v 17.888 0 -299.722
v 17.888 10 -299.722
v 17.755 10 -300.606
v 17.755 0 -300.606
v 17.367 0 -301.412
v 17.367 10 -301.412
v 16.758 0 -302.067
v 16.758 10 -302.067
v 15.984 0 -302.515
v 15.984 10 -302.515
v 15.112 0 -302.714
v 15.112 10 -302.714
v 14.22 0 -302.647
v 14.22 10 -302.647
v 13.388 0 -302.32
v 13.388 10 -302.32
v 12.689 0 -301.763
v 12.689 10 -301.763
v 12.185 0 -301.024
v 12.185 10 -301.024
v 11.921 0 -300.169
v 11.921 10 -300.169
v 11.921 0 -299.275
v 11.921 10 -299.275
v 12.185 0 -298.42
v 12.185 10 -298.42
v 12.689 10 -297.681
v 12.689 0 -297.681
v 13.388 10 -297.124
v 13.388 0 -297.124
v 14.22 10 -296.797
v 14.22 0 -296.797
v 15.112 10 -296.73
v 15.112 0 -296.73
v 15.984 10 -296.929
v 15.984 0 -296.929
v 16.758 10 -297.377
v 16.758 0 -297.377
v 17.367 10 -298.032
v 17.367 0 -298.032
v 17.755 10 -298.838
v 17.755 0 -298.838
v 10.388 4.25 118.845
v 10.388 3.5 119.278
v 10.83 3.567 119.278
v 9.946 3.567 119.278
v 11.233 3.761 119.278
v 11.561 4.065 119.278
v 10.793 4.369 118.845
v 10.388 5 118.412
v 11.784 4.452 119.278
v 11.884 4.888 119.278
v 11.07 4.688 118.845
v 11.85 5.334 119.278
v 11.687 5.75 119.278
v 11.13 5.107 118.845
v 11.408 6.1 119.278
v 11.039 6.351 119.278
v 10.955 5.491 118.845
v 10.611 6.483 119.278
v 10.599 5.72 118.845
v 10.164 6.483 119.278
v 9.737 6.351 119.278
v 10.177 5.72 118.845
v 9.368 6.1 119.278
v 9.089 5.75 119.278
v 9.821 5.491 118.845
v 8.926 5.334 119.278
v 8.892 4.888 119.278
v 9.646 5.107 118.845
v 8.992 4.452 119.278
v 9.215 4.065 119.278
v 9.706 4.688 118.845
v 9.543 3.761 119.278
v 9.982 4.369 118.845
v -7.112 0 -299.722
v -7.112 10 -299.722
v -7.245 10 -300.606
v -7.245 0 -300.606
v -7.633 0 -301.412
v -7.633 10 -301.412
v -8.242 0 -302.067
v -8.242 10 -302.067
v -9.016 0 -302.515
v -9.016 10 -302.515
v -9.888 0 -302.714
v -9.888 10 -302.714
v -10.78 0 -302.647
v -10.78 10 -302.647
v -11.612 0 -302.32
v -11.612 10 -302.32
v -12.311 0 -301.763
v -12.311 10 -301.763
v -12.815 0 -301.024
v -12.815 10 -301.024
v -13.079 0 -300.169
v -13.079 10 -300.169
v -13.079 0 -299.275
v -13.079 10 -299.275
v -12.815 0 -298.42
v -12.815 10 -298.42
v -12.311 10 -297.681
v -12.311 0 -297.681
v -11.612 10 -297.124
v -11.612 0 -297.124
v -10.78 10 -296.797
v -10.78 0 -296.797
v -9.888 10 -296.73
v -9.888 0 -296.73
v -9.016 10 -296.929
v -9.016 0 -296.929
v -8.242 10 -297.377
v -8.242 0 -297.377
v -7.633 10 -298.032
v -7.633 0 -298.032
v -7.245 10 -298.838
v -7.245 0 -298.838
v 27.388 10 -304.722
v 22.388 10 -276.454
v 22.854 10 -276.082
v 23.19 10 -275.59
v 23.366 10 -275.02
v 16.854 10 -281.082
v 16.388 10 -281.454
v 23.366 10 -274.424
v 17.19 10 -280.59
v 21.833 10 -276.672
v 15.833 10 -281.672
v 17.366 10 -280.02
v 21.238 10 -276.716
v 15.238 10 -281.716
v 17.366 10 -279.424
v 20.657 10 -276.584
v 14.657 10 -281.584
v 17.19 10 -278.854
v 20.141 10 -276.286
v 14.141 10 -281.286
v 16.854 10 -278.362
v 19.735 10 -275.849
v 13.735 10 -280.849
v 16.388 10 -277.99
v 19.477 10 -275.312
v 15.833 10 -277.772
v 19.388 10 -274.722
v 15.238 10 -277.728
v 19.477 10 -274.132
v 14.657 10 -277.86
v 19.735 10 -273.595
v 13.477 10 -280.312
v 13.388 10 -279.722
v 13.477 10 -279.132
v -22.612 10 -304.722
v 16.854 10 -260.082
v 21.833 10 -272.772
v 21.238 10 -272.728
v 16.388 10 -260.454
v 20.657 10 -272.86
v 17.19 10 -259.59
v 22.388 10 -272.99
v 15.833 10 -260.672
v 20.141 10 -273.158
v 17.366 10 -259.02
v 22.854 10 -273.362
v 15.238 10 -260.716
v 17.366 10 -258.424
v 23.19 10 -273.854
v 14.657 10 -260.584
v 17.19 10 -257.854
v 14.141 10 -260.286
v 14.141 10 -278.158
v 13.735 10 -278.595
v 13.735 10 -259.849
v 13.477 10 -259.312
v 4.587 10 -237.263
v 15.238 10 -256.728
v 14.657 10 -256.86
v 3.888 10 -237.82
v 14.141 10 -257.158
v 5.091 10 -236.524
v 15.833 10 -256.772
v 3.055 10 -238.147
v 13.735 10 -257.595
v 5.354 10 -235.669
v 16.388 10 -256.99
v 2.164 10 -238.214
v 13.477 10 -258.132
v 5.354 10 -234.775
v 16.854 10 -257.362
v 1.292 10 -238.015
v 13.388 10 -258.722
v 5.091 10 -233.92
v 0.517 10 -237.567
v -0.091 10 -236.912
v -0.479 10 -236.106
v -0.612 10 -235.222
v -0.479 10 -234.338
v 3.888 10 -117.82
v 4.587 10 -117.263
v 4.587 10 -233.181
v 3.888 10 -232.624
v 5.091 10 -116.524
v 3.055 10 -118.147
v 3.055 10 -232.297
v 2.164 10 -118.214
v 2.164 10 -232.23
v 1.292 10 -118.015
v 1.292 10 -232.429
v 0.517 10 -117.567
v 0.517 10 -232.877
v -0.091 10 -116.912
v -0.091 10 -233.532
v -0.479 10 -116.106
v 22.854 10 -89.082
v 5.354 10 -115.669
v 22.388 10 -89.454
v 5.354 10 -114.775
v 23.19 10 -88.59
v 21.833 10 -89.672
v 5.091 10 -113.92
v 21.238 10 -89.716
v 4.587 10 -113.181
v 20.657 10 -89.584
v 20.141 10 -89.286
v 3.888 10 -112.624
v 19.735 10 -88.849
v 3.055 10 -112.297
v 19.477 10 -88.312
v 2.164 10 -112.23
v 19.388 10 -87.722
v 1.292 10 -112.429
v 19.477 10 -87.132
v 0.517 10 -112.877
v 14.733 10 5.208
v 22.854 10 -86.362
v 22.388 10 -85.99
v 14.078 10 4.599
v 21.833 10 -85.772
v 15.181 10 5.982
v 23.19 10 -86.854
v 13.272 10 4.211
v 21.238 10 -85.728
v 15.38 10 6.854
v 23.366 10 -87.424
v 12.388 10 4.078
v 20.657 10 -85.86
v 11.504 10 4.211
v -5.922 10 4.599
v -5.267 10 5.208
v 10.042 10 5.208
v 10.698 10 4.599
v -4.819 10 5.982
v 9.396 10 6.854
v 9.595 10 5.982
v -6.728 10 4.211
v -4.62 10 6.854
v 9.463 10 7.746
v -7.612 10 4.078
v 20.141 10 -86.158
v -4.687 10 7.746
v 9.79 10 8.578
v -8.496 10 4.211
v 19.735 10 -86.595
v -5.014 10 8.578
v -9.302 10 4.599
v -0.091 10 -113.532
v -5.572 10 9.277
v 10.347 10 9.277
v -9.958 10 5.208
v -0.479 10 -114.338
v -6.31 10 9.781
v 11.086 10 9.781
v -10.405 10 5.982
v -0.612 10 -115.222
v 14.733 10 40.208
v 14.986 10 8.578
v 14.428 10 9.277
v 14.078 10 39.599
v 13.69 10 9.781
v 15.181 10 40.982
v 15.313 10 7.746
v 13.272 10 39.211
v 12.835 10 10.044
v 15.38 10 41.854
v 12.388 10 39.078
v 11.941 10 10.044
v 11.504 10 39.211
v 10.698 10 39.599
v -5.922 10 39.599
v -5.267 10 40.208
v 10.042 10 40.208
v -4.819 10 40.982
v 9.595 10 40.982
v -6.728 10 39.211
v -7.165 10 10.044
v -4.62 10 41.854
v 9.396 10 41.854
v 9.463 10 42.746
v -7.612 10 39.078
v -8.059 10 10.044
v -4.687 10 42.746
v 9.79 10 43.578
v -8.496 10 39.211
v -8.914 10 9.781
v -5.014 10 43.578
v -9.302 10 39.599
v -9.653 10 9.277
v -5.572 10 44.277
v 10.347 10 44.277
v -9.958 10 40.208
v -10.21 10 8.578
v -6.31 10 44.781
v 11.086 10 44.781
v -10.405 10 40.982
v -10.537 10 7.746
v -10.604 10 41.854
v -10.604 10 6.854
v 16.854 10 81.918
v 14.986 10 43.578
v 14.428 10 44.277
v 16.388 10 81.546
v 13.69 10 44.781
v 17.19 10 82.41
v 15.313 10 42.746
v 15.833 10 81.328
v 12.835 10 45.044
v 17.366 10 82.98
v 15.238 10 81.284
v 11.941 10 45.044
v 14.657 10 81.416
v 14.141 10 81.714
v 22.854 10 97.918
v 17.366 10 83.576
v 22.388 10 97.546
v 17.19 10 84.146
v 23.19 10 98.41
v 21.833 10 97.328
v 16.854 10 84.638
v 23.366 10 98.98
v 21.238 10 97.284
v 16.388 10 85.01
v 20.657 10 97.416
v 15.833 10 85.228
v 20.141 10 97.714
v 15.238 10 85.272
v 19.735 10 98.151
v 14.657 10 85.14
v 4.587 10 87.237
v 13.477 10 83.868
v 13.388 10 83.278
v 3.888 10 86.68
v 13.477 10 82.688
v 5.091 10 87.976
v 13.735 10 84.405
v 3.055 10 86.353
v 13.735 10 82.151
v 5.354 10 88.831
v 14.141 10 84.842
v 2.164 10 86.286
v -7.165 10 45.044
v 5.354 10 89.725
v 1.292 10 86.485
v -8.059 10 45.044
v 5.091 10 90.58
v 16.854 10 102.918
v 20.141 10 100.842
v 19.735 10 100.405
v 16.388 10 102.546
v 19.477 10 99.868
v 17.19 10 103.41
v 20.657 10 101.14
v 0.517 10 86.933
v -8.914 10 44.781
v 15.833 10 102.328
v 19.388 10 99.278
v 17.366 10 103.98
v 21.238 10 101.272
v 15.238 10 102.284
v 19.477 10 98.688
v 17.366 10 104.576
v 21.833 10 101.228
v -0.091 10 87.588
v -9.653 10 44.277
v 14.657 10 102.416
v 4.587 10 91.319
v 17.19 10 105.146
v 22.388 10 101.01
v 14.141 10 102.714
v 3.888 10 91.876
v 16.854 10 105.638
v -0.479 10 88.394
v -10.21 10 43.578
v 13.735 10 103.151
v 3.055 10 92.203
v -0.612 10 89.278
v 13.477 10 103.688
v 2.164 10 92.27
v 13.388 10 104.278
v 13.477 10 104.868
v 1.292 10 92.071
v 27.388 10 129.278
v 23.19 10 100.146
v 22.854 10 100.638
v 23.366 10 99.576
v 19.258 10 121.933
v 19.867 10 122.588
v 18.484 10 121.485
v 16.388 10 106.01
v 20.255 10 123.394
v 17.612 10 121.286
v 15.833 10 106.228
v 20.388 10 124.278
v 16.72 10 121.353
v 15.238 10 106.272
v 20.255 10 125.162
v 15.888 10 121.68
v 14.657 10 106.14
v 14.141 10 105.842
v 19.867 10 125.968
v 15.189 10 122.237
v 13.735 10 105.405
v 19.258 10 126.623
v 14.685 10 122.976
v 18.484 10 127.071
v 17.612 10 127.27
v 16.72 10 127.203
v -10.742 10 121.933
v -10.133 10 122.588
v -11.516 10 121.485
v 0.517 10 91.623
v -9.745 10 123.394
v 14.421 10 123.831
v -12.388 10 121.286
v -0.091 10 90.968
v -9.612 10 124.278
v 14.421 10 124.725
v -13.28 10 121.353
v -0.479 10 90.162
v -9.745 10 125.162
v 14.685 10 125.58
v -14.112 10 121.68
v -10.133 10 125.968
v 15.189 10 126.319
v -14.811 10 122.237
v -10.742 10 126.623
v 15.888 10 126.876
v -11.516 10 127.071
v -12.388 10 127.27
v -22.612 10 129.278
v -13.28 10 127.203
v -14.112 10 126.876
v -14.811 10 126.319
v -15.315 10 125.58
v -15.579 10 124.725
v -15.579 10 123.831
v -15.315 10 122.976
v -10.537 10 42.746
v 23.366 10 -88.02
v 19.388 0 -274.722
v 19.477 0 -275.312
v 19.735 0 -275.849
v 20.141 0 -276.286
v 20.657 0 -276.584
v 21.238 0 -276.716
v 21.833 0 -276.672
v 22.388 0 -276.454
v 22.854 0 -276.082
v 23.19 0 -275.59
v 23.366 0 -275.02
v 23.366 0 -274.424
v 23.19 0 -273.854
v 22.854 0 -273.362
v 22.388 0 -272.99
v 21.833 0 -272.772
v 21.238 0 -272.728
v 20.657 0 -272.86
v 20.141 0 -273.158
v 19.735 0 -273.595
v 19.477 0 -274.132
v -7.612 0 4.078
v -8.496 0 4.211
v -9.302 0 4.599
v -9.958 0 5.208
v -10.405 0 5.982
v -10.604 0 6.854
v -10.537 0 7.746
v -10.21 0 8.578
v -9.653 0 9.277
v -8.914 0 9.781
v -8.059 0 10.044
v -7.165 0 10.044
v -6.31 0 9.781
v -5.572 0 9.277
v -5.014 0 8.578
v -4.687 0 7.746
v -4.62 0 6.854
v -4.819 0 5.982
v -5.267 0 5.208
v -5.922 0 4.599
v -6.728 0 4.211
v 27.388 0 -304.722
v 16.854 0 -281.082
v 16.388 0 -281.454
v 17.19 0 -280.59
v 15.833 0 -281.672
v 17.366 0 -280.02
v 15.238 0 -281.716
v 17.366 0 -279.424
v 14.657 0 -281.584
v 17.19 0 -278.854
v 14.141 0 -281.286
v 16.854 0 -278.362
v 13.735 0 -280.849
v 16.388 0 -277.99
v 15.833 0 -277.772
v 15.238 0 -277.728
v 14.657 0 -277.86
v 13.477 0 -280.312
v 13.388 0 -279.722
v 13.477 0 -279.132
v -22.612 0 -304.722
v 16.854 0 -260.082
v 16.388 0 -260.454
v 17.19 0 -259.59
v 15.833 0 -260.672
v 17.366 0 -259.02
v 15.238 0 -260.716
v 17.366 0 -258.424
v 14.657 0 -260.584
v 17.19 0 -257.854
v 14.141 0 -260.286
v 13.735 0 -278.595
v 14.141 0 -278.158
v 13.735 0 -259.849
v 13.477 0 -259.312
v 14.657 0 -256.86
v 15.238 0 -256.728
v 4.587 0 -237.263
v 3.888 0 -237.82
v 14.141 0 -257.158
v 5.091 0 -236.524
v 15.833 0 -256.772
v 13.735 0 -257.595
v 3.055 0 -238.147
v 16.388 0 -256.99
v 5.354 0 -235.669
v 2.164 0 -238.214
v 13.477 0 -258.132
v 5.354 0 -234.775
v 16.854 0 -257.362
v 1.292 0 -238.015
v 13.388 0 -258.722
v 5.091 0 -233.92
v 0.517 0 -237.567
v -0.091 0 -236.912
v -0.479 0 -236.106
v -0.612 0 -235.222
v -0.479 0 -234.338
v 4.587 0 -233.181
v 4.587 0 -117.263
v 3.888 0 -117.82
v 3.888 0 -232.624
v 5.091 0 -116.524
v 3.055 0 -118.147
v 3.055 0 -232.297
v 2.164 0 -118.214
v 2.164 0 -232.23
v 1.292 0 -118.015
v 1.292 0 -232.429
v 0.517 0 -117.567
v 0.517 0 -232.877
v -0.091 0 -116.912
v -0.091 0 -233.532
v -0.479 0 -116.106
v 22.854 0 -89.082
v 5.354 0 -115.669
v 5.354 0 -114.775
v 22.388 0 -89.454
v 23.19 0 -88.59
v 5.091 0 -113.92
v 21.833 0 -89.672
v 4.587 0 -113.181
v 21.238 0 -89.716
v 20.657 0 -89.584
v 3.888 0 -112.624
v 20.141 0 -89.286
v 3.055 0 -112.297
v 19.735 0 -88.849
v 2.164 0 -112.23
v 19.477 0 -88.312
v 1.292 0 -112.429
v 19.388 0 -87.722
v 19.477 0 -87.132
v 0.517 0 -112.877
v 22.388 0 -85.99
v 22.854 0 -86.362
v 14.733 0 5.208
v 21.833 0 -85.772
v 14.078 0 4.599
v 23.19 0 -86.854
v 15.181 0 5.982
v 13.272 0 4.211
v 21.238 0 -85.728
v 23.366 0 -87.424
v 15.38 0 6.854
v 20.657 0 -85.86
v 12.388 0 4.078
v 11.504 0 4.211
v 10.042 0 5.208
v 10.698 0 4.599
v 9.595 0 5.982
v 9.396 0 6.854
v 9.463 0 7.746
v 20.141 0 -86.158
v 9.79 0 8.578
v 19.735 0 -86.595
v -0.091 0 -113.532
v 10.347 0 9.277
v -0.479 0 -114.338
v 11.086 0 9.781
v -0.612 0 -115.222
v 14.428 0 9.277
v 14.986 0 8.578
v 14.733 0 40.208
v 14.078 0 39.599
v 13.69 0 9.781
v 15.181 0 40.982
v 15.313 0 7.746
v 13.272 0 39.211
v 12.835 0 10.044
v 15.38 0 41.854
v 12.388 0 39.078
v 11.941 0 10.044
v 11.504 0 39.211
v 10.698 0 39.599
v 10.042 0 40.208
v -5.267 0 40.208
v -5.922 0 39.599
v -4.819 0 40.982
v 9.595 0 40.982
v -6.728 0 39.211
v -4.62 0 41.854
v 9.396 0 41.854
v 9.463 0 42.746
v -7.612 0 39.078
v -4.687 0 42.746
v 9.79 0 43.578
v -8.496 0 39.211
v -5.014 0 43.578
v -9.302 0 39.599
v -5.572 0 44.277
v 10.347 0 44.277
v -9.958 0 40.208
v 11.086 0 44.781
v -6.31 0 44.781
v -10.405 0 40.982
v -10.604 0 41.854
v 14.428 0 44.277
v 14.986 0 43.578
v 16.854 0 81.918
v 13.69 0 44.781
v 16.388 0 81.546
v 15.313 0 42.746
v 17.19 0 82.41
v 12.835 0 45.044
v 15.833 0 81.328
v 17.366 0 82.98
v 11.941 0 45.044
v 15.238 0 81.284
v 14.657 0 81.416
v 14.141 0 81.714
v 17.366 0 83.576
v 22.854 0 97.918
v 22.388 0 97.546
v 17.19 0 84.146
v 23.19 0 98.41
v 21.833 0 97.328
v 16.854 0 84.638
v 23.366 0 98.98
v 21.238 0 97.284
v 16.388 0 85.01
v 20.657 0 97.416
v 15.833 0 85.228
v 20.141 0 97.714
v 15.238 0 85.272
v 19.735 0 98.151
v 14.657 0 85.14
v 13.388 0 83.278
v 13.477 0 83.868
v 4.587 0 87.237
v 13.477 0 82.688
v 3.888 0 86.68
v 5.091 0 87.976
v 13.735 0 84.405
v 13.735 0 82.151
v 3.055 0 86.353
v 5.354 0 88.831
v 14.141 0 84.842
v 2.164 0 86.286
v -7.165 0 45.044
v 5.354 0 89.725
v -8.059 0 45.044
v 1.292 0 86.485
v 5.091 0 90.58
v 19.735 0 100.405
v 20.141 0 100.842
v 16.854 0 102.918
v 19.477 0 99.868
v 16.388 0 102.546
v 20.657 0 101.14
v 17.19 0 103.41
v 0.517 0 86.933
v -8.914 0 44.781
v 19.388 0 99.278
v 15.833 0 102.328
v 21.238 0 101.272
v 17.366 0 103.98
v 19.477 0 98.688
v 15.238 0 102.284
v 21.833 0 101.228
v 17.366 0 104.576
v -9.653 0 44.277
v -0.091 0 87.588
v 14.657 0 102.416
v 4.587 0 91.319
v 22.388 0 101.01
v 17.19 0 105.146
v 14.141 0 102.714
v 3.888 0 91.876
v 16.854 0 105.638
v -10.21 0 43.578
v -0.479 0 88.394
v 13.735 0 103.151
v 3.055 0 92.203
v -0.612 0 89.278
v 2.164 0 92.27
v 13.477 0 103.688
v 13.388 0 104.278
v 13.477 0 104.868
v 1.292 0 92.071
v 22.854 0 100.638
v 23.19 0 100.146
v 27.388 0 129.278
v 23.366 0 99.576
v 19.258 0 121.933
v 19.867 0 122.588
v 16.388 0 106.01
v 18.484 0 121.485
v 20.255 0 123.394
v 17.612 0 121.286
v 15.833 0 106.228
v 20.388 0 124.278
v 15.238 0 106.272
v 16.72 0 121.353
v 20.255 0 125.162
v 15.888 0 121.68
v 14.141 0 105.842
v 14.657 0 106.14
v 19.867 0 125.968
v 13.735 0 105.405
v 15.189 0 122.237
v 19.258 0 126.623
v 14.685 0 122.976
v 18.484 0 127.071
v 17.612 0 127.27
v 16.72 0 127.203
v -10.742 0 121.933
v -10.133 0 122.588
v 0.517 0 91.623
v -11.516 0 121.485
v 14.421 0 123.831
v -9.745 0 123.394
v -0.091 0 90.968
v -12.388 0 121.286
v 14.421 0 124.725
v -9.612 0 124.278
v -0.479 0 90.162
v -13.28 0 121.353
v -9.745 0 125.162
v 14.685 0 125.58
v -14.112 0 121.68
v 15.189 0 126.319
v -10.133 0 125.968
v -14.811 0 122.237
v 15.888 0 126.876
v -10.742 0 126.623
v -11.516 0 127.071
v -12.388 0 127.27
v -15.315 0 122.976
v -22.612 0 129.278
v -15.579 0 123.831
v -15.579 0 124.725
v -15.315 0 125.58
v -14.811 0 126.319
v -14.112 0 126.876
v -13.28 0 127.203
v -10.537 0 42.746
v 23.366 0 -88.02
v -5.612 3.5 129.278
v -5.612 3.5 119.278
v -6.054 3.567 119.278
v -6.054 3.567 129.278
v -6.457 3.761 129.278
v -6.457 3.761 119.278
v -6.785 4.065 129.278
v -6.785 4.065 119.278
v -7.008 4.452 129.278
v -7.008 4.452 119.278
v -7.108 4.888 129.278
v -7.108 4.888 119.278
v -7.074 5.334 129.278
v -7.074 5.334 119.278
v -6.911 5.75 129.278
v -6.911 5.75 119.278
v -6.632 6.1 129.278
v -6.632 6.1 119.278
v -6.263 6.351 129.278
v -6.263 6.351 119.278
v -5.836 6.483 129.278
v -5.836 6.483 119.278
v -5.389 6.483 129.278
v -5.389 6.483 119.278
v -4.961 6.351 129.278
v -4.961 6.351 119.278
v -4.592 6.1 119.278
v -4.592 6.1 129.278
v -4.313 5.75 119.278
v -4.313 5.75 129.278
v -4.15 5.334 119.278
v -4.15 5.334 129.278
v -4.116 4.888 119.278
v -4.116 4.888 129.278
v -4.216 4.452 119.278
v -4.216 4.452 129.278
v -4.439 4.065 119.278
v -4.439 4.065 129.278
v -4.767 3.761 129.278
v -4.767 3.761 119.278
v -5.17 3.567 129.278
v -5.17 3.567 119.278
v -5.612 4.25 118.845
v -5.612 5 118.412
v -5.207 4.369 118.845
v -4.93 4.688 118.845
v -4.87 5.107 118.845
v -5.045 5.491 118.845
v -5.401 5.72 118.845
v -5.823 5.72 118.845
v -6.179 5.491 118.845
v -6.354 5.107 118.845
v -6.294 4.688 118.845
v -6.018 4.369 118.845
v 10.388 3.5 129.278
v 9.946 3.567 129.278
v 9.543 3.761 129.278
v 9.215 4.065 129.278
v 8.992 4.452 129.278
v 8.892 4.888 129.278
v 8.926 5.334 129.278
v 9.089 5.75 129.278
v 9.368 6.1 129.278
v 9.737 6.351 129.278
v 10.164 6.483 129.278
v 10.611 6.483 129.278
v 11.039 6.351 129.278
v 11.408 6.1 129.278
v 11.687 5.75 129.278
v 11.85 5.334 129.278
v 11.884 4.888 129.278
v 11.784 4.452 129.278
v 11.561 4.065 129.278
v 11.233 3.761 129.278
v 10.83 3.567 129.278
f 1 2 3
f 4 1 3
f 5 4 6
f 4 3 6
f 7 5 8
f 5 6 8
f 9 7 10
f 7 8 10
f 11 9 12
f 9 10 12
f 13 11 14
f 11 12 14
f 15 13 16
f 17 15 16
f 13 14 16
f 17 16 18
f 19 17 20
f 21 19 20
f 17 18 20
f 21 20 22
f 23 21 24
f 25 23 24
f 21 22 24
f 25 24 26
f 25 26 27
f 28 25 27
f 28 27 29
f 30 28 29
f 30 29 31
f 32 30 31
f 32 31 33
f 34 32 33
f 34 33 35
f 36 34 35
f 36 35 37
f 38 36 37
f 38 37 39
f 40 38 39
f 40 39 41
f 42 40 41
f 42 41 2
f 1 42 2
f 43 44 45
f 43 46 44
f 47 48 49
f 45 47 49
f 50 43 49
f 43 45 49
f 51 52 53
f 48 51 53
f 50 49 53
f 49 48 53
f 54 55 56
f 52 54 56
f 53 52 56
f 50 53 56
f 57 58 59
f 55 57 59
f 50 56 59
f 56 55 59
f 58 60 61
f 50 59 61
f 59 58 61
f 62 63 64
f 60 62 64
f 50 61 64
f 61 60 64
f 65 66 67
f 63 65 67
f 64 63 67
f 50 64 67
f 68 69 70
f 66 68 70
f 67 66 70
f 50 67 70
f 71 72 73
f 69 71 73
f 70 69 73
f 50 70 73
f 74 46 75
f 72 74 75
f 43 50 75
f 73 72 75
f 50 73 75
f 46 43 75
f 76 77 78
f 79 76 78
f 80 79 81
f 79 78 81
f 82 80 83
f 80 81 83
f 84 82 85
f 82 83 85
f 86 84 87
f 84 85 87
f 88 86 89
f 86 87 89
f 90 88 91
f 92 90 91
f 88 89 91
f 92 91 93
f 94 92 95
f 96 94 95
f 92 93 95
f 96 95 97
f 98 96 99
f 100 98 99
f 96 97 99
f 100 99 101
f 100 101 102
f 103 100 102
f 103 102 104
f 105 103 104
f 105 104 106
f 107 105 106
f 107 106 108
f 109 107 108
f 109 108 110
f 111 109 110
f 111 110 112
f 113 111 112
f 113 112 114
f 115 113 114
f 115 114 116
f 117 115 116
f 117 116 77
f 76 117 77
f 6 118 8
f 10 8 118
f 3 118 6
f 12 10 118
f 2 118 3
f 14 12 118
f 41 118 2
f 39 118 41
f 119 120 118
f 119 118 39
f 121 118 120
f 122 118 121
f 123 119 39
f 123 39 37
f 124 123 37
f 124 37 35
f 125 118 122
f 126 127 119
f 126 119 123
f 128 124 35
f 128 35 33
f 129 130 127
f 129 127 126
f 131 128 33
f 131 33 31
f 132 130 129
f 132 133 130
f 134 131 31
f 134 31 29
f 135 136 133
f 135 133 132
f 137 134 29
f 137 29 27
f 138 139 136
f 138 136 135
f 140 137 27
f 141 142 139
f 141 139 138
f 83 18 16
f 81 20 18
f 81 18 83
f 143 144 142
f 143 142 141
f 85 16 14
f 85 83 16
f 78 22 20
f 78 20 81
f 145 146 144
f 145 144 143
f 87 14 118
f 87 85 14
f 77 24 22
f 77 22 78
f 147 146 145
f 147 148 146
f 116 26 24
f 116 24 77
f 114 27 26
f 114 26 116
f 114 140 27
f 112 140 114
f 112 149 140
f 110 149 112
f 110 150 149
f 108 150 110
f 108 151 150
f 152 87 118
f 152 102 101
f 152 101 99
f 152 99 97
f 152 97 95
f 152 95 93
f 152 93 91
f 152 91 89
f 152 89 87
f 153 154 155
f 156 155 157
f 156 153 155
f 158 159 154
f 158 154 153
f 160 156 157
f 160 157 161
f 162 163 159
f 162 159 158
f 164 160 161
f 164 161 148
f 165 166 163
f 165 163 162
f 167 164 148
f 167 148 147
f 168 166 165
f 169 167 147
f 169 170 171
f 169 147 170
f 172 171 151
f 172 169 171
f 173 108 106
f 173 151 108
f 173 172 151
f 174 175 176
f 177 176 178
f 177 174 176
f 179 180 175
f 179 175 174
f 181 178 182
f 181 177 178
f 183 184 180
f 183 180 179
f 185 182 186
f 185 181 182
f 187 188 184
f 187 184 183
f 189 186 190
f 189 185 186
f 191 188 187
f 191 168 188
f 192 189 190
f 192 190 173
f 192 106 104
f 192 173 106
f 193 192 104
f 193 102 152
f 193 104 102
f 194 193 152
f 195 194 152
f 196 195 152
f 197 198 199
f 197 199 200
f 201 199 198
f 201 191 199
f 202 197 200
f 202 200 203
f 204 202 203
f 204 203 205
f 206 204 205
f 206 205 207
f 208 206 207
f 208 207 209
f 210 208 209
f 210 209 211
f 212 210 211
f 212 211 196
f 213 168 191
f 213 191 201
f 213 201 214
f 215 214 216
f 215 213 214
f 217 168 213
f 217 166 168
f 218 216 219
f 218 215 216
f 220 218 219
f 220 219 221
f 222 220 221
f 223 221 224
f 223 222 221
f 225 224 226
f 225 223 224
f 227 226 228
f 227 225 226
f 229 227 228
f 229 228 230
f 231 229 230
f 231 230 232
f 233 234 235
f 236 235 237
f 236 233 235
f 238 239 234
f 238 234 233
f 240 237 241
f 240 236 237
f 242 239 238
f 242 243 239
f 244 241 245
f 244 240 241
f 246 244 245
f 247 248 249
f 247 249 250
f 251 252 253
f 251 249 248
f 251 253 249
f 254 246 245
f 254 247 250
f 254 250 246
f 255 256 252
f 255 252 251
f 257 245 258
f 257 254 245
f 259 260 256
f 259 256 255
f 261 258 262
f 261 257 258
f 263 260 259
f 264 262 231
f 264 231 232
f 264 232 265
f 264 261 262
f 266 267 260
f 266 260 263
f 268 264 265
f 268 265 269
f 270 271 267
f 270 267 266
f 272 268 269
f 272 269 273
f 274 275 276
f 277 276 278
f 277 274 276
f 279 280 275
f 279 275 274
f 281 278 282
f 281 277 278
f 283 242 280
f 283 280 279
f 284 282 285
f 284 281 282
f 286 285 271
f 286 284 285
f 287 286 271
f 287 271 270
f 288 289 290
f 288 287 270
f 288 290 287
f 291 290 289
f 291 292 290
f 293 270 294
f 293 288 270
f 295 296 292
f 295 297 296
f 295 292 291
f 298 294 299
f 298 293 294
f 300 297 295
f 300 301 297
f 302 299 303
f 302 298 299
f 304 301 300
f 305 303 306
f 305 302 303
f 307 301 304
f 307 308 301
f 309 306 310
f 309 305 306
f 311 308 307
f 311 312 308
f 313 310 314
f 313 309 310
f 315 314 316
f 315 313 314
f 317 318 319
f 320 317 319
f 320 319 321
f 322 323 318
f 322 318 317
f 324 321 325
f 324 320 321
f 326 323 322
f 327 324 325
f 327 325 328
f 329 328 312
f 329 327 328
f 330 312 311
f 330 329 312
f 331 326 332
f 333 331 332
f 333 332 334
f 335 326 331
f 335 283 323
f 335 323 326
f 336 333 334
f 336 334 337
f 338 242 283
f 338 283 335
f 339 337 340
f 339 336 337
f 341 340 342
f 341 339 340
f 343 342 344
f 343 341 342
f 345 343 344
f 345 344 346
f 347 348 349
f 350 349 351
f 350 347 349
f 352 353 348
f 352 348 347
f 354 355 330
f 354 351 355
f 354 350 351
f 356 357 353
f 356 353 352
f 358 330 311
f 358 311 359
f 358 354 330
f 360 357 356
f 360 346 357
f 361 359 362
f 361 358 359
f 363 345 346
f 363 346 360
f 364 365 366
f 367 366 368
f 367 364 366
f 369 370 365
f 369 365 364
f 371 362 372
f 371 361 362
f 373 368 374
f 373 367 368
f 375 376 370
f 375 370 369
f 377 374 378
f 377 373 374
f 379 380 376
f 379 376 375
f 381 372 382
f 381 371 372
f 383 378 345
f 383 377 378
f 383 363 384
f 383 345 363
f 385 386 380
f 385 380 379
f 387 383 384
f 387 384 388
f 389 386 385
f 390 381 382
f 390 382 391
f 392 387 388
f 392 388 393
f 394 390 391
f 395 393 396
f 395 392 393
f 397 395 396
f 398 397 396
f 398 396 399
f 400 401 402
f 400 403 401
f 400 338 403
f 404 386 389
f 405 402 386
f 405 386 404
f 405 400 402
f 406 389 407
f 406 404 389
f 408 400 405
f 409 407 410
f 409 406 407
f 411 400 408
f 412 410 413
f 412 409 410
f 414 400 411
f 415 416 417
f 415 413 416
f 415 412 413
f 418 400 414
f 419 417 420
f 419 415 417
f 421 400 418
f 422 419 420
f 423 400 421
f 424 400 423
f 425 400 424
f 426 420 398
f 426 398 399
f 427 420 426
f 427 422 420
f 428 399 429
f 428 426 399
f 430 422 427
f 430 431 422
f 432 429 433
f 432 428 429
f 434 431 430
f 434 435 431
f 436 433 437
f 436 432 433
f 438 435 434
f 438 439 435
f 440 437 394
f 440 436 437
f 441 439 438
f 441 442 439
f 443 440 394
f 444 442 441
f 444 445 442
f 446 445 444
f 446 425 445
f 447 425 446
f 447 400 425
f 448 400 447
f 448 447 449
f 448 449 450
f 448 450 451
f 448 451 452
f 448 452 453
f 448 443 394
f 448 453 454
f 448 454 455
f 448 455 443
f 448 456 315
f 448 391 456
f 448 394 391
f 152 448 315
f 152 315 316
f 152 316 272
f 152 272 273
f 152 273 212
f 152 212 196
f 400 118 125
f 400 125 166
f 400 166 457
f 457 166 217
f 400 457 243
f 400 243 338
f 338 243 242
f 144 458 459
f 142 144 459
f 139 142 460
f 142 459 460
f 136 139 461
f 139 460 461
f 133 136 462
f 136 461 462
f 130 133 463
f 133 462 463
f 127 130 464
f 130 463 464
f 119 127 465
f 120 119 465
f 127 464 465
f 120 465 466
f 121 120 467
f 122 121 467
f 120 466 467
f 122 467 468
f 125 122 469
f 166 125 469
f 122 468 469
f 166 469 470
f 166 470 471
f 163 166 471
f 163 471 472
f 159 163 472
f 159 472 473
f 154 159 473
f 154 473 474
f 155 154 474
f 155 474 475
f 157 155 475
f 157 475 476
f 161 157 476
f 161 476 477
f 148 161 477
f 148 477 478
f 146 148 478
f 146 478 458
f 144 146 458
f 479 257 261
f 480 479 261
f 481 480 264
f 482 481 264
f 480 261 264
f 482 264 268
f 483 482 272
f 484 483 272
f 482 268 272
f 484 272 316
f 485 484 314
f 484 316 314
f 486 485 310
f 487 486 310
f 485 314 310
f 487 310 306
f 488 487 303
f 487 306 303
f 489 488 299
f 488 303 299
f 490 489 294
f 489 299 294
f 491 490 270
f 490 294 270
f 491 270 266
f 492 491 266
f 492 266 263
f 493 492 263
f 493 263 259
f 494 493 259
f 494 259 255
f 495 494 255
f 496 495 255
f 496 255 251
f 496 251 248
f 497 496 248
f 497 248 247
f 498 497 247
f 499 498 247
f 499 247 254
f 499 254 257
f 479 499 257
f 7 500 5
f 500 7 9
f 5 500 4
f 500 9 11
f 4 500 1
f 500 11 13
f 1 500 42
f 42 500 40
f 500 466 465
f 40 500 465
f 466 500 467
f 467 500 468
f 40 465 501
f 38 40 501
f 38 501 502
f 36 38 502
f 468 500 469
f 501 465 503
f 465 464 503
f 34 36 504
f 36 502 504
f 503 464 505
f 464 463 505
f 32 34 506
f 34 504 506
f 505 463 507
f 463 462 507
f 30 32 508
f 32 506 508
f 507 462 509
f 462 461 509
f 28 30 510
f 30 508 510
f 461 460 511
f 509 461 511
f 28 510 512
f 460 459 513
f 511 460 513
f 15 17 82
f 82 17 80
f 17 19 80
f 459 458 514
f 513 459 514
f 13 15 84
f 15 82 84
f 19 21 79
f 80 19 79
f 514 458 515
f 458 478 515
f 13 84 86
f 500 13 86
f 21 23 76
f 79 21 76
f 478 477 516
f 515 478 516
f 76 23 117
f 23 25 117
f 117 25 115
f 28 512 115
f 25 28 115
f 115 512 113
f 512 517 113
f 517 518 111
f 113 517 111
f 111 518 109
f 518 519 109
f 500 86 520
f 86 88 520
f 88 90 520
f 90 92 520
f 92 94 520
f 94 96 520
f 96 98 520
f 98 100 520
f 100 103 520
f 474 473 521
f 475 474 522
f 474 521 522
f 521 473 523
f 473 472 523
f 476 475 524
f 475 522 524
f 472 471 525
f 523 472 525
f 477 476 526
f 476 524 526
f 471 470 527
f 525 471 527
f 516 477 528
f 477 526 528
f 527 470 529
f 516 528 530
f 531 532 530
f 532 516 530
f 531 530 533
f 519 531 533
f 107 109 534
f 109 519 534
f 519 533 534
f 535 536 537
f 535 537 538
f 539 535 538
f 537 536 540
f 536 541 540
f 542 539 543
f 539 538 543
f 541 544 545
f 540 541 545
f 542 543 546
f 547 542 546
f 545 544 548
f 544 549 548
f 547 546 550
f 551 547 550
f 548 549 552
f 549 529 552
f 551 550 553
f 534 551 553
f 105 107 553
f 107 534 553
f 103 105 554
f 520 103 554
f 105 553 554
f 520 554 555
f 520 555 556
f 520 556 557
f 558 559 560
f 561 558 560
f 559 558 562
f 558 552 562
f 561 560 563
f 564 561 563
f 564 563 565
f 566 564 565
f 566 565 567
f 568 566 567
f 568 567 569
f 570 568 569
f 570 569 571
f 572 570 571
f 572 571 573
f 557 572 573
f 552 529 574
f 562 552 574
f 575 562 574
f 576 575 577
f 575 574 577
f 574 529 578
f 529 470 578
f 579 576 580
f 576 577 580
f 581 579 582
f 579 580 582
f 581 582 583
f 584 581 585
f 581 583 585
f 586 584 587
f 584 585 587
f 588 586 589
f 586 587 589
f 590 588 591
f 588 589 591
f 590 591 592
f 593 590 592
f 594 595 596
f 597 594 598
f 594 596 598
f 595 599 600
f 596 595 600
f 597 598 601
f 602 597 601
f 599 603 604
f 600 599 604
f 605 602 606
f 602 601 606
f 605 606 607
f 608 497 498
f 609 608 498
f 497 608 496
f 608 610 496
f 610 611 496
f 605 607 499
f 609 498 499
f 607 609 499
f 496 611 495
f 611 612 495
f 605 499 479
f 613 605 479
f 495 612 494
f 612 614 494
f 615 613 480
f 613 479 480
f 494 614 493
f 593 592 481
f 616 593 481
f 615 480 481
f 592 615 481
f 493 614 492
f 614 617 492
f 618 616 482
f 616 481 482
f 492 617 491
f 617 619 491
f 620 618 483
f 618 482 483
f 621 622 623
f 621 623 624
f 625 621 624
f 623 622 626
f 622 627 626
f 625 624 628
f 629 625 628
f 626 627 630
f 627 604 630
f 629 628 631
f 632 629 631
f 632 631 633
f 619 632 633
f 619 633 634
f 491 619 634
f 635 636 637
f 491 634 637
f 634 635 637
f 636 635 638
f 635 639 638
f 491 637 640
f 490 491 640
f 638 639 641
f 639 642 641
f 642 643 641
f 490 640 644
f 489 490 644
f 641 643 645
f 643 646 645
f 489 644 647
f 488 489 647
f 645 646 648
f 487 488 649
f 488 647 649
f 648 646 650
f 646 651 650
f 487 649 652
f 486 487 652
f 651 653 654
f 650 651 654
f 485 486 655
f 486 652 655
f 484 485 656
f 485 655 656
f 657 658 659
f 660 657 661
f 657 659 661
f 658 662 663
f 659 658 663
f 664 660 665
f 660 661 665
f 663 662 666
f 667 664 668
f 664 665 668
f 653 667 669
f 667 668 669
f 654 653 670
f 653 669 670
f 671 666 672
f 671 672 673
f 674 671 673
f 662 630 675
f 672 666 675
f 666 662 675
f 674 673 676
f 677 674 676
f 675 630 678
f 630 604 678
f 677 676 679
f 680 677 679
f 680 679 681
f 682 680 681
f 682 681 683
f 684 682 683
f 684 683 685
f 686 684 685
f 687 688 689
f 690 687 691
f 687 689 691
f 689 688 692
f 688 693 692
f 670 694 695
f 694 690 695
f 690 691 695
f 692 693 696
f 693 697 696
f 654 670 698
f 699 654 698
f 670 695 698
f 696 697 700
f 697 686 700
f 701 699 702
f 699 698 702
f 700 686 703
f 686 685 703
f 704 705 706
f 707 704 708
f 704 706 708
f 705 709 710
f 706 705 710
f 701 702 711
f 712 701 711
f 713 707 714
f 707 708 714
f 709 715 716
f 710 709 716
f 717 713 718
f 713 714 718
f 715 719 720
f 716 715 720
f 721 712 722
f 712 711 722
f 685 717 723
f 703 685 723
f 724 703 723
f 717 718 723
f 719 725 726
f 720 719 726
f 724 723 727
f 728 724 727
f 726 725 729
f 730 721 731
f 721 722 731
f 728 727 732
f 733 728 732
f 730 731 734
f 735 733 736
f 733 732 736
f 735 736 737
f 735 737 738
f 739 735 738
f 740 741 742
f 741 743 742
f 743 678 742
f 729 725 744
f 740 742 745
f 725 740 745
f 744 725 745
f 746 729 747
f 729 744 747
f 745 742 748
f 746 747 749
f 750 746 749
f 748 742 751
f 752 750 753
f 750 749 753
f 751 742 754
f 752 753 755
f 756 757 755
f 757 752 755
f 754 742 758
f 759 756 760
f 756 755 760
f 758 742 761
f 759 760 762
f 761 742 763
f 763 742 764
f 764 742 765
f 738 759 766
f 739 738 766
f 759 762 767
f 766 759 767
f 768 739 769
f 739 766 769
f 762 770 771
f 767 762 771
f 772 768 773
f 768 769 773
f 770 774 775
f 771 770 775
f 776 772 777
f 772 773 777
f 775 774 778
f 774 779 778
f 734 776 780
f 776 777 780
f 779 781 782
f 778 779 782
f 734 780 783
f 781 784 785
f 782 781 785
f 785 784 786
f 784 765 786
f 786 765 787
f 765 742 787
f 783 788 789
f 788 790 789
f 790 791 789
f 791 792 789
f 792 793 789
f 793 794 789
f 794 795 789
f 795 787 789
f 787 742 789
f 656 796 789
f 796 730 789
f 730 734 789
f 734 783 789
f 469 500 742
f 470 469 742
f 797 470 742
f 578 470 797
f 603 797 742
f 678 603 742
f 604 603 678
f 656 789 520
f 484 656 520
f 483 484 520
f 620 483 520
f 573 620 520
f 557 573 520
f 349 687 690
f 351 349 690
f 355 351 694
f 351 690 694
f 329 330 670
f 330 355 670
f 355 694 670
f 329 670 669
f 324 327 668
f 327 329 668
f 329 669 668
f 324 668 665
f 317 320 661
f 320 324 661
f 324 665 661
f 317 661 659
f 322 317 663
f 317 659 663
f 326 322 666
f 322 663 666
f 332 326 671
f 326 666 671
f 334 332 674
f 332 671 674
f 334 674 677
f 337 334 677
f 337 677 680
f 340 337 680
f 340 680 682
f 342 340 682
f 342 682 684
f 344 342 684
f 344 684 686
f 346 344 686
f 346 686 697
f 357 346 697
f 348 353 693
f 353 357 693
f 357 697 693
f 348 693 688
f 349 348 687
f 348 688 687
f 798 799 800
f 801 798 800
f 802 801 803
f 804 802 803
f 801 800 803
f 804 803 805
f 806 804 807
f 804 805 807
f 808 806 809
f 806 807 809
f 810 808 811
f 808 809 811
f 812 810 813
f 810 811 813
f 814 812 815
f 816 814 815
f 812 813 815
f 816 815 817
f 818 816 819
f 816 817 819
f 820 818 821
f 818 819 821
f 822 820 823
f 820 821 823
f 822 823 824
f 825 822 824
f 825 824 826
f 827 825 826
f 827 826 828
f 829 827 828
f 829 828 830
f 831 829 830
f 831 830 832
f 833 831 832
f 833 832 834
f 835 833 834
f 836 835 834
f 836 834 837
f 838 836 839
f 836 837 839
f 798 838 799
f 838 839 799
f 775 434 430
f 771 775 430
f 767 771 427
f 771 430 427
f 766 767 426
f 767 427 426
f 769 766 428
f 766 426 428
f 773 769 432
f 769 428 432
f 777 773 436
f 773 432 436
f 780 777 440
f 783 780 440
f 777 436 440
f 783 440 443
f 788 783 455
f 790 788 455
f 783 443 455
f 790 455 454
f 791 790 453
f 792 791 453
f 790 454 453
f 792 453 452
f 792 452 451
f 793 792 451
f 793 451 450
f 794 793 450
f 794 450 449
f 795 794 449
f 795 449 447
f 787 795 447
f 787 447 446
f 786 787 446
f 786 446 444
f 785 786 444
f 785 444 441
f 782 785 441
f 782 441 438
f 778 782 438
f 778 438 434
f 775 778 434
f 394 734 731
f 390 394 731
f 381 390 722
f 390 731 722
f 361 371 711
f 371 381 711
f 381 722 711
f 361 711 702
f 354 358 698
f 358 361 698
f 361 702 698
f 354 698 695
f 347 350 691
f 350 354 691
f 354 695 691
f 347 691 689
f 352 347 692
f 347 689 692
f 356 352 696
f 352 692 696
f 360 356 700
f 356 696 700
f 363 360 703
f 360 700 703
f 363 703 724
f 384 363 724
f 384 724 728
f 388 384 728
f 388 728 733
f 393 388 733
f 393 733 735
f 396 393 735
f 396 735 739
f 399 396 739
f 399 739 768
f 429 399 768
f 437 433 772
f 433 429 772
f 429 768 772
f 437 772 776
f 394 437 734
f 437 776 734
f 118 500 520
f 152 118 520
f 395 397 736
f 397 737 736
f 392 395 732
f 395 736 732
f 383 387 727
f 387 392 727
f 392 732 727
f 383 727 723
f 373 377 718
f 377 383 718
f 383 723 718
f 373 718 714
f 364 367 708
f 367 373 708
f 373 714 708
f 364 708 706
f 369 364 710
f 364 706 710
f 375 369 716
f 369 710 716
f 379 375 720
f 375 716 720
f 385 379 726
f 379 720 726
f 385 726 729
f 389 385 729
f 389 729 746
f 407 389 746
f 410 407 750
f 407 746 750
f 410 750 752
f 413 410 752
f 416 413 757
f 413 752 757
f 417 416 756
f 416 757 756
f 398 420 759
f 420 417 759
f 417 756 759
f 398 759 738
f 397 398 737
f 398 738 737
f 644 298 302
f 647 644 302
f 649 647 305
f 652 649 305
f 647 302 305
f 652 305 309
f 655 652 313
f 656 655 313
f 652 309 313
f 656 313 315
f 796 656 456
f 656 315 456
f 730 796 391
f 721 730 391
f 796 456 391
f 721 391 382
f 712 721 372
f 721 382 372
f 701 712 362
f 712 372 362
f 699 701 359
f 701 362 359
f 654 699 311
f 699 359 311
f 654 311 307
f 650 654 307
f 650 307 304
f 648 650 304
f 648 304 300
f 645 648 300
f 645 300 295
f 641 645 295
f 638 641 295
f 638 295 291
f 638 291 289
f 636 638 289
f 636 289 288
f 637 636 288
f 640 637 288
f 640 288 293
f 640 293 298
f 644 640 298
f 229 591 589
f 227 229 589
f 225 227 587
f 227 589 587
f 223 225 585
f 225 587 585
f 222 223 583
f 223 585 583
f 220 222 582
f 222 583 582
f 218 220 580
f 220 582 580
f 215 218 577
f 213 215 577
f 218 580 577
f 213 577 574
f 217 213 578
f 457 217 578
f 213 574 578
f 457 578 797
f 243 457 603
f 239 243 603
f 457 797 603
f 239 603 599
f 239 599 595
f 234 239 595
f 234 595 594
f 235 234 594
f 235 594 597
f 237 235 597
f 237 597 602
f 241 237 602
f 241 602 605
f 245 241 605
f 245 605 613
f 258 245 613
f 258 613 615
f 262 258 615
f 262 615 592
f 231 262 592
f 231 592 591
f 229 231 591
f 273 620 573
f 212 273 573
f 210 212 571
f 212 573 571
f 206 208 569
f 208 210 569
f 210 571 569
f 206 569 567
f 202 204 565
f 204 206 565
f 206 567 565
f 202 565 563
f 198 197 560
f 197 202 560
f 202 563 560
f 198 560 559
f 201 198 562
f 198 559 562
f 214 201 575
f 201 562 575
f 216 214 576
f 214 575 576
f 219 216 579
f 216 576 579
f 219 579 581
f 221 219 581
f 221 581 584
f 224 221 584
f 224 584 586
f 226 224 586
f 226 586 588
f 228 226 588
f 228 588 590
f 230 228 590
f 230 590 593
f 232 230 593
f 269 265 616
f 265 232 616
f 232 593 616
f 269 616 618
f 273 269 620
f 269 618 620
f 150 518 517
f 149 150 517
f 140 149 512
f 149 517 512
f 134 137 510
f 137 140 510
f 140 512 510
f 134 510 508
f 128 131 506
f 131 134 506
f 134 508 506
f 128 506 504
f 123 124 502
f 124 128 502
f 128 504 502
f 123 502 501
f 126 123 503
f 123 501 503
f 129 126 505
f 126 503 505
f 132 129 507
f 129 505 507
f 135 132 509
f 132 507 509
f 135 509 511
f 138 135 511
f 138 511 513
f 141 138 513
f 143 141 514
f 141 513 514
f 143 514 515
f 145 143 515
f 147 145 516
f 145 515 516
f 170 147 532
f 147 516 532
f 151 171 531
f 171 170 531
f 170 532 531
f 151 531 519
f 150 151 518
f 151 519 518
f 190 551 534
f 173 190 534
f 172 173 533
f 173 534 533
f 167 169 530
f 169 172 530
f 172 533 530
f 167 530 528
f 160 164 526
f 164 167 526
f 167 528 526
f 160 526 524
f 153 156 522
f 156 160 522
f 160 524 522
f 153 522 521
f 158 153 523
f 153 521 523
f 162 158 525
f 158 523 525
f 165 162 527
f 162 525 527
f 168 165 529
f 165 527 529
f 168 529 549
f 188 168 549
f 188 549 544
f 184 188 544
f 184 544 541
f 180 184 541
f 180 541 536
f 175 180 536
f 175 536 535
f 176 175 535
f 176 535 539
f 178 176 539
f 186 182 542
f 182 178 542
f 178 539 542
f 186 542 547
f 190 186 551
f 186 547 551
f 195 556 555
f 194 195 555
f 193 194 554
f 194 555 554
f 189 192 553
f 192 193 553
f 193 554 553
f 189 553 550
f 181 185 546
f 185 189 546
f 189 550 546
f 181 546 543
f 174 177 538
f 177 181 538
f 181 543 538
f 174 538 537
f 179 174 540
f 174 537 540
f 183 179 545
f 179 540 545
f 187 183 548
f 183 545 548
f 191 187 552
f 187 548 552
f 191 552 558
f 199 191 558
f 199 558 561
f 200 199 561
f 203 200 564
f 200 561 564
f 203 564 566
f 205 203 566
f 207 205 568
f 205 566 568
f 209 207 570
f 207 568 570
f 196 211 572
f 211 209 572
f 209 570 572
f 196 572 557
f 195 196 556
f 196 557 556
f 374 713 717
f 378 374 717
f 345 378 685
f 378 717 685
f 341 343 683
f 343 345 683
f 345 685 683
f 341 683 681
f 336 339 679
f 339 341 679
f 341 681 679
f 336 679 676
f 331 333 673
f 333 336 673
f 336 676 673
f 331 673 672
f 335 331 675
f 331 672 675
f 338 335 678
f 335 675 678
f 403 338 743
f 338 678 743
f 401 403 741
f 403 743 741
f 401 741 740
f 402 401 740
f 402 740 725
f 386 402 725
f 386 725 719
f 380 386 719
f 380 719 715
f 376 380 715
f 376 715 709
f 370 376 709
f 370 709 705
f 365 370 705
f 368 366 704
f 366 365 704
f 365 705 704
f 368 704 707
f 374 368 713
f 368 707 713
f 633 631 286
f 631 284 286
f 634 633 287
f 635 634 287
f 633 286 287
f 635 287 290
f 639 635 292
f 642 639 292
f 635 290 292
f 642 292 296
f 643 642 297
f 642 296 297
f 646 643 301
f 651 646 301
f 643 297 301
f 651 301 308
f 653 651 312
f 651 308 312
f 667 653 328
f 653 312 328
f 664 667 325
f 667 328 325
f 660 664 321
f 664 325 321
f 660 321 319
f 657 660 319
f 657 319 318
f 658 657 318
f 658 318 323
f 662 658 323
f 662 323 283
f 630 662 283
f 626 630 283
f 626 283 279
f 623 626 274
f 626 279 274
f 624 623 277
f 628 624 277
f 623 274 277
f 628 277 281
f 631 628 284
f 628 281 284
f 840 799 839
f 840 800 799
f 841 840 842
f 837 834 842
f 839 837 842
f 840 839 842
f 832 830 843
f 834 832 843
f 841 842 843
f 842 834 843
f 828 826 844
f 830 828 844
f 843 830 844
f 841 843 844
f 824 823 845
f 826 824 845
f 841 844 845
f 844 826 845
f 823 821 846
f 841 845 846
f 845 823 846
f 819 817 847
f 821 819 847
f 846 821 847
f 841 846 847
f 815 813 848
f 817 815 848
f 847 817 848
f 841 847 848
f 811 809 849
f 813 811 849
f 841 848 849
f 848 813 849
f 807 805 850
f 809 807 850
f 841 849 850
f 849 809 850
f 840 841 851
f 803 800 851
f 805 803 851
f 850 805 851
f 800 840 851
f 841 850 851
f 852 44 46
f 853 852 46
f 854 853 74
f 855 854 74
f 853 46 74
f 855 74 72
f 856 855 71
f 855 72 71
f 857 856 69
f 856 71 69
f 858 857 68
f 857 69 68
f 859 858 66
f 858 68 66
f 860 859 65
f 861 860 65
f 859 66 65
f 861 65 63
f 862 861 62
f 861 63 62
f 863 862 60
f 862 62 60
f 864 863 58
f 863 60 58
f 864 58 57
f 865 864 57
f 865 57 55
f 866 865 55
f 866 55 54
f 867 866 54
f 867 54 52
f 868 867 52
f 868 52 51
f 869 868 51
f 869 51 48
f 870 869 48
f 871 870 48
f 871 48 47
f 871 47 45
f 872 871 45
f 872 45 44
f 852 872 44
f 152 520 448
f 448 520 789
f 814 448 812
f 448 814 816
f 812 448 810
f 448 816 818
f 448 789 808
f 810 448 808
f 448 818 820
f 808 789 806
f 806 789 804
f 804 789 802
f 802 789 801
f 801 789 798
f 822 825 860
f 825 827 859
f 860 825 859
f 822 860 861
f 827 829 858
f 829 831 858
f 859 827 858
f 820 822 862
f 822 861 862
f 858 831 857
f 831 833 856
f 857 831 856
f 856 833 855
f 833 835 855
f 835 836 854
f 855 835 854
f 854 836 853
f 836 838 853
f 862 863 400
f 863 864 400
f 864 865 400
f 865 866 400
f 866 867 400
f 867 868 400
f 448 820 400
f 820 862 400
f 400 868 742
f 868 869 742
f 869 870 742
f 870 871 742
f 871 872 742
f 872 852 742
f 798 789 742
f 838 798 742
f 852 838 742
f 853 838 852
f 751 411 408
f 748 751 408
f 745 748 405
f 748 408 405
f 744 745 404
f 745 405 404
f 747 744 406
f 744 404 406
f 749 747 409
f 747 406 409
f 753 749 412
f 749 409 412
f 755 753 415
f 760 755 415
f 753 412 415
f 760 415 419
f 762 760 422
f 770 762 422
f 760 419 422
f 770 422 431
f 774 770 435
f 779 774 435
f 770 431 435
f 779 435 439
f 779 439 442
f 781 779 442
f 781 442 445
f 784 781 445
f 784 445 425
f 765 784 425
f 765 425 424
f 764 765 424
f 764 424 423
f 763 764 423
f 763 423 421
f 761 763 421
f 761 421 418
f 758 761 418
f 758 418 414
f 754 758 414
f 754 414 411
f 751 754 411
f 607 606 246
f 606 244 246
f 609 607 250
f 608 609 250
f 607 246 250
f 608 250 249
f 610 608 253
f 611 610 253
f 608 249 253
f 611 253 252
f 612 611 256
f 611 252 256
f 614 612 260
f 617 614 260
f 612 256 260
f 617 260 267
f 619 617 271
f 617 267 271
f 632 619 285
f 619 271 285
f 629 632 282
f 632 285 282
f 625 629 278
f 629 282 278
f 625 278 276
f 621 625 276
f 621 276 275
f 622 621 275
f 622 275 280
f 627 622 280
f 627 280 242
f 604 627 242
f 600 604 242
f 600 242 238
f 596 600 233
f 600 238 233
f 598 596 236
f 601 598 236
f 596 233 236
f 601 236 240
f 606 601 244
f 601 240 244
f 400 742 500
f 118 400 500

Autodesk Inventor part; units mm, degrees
ref_plane "YZ Plane" through (0, 0, 0) normal (1, 0, 0) x (0, 1, 0)
ref_plane "XZ Plane" through (0, 0, 0) normal (0, 1, 0) x (-1, 0, 0)
ref_plane "XY Plane" through (0, 0, 0) normal (0, 0, 1) x (1, 0, 0)
sketch "Boceto1" plane through (0, 0, 0) normal (0, 1, 0) x (-1, 0, 0)
  line L0 (22.6121, 129.278) -> (-27.3879, 129.278)
  line L1 (-27.3879, 129.278) -> (-27.3879, -304.722)
  line L2 (-27.3879, -304.722) -> (22.6121, -304.722)
  line L3 (22.6121, -304.722) -> (22.6121, 129.278)
  circle A0 centre (-15.3879, 104.278) radius 2
  circle A1 centre (-15.3879, 83.278) radius 2
  line L4 (-27.3879, -87.722) -> (-4.9043, -87.722)
  circle A2 centre (-15.3879, -279.722) radius 2
  circle A3 centre (-15.3879, -258.722) radius 2
  line L5 (-27.3879, -304.722) -> (-21.3879, -304.722)
  line L6 (-21.3879, -304.722) -> (-21.3879, -274.722)
  circle A4 centre (-21.3879, -274.722) radius 2
  circle A5 centre (-21.3879, -87.722) radius 2
  circle A6 centre (-21.3879, 99.278) radius 2
  circle A7 centre (-2.3879, -235.222) radius 3
  circle A8 centre (-2.3879, -115.222) radius 3
  circle A9 centre (-2.3879, 89.278) radius 3
  dimension "d4" = 434
  dimension "d5" = 50
  dimension "d16" = 4
  dimension "d17" = 4
  dimension "d18" = 25
  dimension "d19" = 21
  dimension "d20" = 12
  dimension "d21" = 12
  dimension "d85" = 12
  dimension "d86" = 12
  dimension "d87" = 21
  dimension "d89" = 30
  dimension "d90" = 4
  dimension "d91" = 4
  dimension "d92" = 44
  dimension "d93" = 44
  dimension "d94" = 217
  dimension "d95" = 6
  dimension "d96" = 25
  dimension "d97" = 69.5
  dimension "d98" = 6
  dimension "d99" = 120
  dimension "d100" = 25
  dimension "d101" = 6
  dimension "d102" = 25
  dimension "d103" = 40
extrude "Extrusión1" add sketch "Boceto1" along normal blind 10
sketch "Boceto2" plane through (0, 10, 0) normal (0, 1, 0) x (1, 0, 0)
  line L0 (-22.6121, -129.278) -> (27.3879, -129.278) projected
  line L1 (-22.6121, -129.278) -> (-22.6121, -124.278)
  line L2 (-22.6121, 304.722) -> (-22.6121, -129.278) projected
  line L3 (-22.6121, -124.278) -> (27.3879, -124.278)
  line L4 (27.3879, -129.278) -> (27.3879, 304.722) projected
  line L5 (27.3879, 304.722) -> (-22.6121, 304.722) projected
  line L6 (-22.6121, 304.722) -> (-22.6121, 299.722)
  line L7 (-22.6121, 299.722) -> (27.3879, 299.722)
  line L8 (-22.6121, -124.278) -> (-12.6121, -124.278)
  line L9 (27.3879, 299.722) -> (14.8879, 299.722)
  circle A0 centre (-12.6121, -124.278) radius 3
  circle A1 centre (17.3879, -124.278) radius 3
  circle A2 centre (-10.1121, 299.722) radius 3
  circle A3 centre (14.8879, 299.722) radius 3
  dimension "d6" = 5
  dimension "d7" = 5
  dimension "d8" = 10
  dimension "d9" = 12.5
  dimension "d10" = 6
  dimension "d11" = 6
  dimension "d12" = 6
  dimension "d13" = 6
  dimension "d30" = 5
  dimension "d74" = 5
  dimension "d110" = 10
extrude "Extrusión2" cut sketch "Boceto2" against normal blind 20 contours A0 L3 | L3 A0 | A1 L3 | L3 A1 | A2 L7 | L7 A2 | A3 L7 | L7 A3
thread "Thread1" size "M4x0.7" class "6H" standard "ANSI Metric M Profile" length 40
thread "Thread2" size "M4x0.7" class "6H" standard "ANSI Metric M Profile" length 40
sketch "Boceto3" plane through (0, 0, 0) normal (0, -1, 0) x (1, 0, 0)
  line L0 (27.3879, 129.278) -> (27.3879, -304.722) projected
  line L1 (12.3879, 42.078) -> (-7.6121, 42.078)
  line L2 (-7.6121, 42.078) -> (-7.6121, 7.078)
  line L3 (-7.6121, 7.078) -> (12.3879, 7.078)
  line L4 (12.3879, 7.078) -> (12.3879, 42.078)
  circle A0 centre (12.3879, 7.078) radius 3
  circle A1 centre (-7.6121, 7.078) radius 3
  circle A2 centre (12.3879, 42.078) radius 3
  circle A3 centre (-7.6121, 42.078) radius 3
  line L5 (-22.6121, 129.278) -> (27.3879, 129.278) projected
  line L6 (-22.6121, -304.722) -> (-22.6121, 129.278) projected
  point P0 (-14161.5164, 17179.1084)
  point P1 (-14161.5164, 17617.1084)
  point P2 (-14211.5164, 17617.1084)
  point P3 (-14211.5164, 17179.1084)
  dimension "d58" = 35
  dimension "d59" = 15
  dimension "d60" = 87.2
  dimension "d61" = 15
  dimension "d62" = 20
hole "Agujero1" at (12.3879, 0, 42.078) at (-7.6121, 0, 42.078) at (12.3879, 0, 7.078) at (-7.6121, 0, 7.078) direction (0, 1, 0) diameter 6 depth 12 tip angle 118
thread "Rosca5" size "M4x0.7" class "6H" standard "ISO Metric profile" length 430
thread "Rosca6" size "M4x0.7" class "6H" standard "ISO Metric profile" length 430
thread "Rosca7" size "M6x1" class "6H" standard "ISO Metric profile" length 430
thread "Rosca8" size "M6x1" class "6H" standard "ISO Metric profile" length 430
thread "Rosca9" size "M6x1" class "6H" standard "ISO Metric profile" length 430
thread "Rosca10" size "M6x1" class "6H" standard "ISO Metric profile" length 430
thread "Rosca11" size "M4x0.7" class "6H" standard "ISO Metric profile" length 430
thread "Rosca12" size "M6x1" class "6H" standard "ISO Metric profile" length 100
thread "Rosca13" size "M6x1" class "6H" standard "ISO Metric profile" length 100
thread "Rosca14" size "M6x1" class "6H" standard "ISO Metric profile" length 100
sketch "Sketch4" plane through (-22.6121, 0, 129.278) normal (0, 0, 1) x (1, 0, 0)
  circle A0 centre (17, 5) radius 1.25
  line L0 (0, 10) -> (50, 10) projected
  circle A1 centre (33, 5) radius 1.25
  line L1 (0, 0) -> (0, 10) projected
  dimension "d111" = 2.5
  dimension "d113" = 5
  dimension "d115" = 2.5
  dimension "d116" = 5
  dimension "d117" = 16
  dimension "d118" = 17
hole "Hole2" at (-5.6121, 5, 129.278) at (10.3879, 5, 129.278) direction (0, 0, -1) diameter 3 depth 10 tip angle 120
thread "Thread15" size "M3x0.5" class "6H" standard "ISO Metric profile" length 6
thread "Thread16" size "M3x0.5" class "6H" standard "ANSI Metric M Profile" length 6
equation "\"d100\" = d96"
equation "\"d102\" = d96"
equation "\"d110\" = d8"
equation "\"d115\" = d111"
equation "\"d116\" = d113"
properties part number "Lateral" material "Aluminio 6061"
